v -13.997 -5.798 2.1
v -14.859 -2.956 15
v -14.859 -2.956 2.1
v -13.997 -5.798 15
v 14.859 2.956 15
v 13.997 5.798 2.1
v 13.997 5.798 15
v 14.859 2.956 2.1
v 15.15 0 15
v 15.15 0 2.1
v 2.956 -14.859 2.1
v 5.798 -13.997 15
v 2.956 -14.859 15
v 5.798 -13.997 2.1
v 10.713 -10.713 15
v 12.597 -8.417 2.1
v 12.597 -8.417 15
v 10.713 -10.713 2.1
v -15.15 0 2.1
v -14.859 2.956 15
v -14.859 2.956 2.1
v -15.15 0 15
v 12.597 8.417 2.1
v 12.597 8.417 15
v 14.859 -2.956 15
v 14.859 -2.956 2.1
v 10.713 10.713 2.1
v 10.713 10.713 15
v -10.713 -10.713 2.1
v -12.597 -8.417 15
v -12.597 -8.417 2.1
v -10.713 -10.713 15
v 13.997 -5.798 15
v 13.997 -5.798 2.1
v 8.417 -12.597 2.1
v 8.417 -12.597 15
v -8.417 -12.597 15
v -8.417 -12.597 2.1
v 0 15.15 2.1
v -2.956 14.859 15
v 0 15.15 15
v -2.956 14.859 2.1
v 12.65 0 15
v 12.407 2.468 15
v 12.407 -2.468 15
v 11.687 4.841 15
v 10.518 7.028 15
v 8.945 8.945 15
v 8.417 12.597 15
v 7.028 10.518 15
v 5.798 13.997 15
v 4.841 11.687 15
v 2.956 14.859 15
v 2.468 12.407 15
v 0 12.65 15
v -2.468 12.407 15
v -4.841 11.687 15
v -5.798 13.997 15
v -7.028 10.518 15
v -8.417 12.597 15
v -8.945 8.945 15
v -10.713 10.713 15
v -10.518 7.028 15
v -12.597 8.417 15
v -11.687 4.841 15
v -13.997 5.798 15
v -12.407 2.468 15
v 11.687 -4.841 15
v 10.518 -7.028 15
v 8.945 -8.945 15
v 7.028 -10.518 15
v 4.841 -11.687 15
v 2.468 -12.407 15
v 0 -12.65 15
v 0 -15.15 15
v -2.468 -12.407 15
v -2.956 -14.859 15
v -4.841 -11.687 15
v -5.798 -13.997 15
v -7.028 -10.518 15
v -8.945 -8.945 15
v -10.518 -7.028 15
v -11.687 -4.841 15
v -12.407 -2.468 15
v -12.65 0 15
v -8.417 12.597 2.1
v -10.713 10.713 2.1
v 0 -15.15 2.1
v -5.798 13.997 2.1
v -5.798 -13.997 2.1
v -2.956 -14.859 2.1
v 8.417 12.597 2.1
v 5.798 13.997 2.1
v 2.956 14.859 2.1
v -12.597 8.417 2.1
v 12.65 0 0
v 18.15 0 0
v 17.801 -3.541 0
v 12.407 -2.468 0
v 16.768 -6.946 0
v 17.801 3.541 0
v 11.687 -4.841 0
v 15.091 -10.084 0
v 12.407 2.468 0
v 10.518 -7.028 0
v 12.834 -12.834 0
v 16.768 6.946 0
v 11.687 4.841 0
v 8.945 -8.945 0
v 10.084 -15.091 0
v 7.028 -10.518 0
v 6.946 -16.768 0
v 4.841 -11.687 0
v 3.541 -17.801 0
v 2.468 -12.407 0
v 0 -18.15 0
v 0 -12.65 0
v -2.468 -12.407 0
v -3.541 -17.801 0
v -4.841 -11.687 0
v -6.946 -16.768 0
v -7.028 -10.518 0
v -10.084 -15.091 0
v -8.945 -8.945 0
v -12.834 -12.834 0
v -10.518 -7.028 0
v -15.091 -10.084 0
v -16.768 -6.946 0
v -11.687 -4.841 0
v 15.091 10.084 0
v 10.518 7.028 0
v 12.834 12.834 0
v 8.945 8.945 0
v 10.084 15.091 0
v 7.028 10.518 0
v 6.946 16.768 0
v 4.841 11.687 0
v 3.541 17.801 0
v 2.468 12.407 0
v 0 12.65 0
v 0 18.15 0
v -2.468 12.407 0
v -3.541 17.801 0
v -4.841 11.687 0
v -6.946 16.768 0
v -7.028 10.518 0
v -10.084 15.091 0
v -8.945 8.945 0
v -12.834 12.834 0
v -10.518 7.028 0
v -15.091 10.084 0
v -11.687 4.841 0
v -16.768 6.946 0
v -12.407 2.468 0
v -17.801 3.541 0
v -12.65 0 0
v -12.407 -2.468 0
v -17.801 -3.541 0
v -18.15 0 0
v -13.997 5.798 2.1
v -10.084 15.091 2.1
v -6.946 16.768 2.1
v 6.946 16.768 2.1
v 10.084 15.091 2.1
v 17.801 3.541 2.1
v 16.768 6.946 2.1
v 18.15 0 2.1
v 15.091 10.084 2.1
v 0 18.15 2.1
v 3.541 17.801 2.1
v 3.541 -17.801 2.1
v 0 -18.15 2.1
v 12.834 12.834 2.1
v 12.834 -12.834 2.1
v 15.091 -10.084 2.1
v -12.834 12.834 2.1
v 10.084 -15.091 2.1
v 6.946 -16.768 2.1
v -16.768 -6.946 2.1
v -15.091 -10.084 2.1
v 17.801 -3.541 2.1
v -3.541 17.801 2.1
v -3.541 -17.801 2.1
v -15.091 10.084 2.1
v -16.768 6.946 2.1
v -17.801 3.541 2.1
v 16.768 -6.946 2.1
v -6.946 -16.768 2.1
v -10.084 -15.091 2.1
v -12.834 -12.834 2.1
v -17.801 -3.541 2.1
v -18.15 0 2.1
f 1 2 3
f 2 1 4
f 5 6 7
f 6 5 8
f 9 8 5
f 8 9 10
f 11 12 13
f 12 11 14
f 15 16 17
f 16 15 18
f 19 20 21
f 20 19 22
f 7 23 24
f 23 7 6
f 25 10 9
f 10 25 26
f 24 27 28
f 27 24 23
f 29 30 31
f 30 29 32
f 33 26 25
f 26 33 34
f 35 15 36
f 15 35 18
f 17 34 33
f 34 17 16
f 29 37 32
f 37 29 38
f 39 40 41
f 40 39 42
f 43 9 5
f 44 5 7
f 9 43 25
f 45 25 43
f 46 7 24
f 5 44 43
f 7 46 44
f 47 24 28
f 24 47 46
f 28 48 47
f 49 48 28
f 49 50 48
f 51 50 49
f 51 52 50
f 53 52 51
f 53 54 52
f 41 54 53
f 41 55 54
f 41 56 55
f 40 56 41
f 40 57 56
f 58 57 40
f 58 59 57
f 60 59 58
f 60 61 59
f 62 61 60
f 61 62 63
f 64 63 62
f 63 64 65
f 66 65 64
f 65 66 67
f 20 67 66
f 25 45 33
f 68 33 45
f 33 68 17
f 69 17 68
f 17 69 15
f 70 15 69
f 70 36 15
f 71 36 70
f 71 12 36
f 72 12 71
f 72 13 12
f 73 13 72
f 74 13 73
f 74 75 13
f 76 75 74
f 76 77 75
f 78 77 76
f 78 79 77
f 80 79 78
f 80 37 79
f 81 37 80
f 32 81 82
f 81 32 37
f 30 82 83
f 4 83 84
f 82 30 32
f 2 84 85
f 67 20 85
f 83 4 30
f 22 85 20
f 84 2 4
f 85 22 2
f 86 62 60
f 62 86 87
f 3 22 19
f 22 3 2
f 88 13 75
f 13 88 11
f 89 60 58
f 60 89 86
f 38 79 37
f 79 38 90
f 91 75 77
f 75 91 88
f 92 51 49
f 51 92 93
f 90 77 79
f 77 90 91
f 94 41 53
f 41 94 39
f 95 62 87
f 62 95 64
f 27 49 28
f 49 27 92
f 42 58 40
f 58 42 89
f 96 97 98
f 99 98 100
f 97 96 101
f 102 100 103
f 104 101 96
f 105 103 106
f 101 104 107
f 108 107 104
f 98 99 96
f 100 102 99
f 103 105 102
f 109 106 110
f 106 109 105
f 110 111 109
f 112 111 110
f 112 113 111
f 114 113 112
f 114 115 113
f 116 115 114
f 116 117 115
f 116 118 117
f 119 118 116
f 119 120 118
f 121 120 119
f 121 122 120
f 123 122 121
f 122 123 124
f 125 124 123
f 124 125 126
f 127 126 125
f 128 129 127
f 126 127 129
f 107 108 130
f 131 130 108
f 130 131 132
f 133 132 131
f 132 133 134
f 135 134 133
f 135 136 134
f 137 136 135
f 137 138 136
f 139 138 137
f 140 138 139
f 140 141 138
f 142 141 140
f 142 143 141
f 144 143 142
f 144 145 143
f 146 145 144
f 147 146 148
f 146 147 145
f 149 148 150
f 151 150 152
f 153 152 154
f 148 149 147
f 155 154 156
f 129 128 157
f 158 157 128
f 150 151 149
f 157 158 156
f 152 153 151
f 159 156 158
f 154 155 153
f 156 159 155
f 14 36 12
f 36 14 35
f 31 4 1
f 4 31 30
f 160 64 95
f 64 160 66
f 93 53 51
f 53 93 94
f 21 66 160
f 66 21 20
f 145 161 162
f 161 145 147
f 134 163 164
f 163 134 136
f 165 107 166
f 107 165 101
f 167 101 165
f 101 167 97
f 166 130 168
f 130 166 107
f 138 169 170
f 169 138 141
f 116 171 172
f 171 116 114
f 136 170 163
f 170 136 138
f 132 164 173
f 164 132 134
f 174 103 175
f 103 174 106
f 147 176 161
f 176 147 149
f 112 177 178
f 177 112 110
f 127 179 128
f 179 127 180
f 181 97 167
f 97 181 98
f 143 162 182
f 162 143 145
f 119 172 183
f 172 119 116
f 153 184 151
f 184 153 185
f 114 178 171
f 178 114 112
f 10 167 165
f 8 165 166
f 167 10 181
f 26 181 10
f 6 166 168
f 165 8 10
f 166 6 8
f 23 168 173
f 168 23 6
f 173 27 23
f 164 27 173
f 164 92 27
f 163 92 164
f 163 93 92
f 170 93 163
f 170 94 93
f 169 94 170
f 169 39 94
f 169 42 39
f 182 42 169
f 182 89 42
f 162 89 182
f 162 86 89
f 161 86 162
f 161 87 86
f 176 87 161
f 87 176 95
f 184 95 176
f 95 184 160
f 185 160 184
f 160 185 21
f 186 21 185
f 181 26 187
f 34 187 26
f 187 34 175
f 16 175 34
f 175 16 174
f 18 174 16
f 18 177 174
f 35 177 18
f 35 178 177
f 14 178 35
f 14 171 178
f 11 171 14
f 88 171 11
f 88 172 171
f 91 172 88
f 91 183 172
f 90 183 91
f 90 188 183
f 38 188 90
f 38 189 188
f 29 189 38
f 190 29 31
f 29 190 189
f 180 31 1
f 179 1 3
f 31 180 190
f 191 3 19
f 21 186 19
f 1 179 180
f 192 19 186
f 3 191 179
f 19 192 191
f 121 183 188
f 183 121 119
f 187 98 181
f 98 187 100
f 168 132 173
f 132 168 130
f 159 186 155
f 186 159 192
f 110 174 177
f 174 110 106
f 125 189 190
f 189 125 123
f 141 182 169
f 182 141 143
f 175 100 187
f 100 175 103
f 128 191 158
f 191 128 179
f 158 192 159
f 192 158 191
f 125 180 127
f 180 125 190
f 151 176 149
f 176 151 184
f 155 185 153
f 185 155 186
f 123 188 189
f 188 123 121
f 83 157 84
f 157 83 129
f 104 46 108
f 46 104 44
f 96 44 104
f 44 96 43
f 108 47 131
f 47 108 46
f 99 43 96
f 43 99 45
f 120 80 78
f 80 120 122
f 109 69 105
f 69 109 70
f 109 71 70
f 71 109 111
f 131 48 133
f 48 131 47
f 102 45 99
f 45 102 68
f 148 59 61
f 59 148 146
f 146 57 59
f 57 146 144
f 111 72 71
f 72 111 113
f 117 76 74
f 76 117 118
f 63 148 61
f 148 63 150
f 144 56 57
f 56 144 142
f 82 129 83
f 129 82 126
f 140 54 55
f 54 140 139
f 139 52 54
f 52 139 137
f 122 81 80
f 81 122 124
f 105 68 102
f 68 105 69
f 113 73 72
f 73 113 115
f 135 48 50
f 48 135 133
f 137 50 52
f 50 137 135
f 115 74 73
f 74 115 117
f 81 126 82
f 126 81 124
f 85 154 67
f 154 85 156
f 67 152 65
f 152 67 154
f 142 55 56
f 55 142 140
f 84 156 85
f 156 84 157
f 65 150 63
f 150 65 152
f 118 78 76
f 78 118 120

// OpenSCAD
$fn = 32;

// ----------------------------------------------------------------------
// Spacer sleeve: 30.3 / 25.3 x 15 mm
// ----------------------------------------------------------------------

// --- parameters (mm) ---
sleeve_od = 30.3;         // outside diameter
sleeve_id = 25.3;         // shaft bore
sleeve_l = 15;            // sleeve length
flange_d = 36.3;          // collar diameter
flange_t = 1.5;           // collar thickness

module sleeve() {
  cylinder(h = sleeve_l, d = sleeve_od);
  cylinder(h = flange_t + 0.6, d = flange_d);
}

difference() {
  sleeve();
  translate([0, 0, -1]) cylinder(h = sleeve_l + 2, d = sleeve_id);
}
